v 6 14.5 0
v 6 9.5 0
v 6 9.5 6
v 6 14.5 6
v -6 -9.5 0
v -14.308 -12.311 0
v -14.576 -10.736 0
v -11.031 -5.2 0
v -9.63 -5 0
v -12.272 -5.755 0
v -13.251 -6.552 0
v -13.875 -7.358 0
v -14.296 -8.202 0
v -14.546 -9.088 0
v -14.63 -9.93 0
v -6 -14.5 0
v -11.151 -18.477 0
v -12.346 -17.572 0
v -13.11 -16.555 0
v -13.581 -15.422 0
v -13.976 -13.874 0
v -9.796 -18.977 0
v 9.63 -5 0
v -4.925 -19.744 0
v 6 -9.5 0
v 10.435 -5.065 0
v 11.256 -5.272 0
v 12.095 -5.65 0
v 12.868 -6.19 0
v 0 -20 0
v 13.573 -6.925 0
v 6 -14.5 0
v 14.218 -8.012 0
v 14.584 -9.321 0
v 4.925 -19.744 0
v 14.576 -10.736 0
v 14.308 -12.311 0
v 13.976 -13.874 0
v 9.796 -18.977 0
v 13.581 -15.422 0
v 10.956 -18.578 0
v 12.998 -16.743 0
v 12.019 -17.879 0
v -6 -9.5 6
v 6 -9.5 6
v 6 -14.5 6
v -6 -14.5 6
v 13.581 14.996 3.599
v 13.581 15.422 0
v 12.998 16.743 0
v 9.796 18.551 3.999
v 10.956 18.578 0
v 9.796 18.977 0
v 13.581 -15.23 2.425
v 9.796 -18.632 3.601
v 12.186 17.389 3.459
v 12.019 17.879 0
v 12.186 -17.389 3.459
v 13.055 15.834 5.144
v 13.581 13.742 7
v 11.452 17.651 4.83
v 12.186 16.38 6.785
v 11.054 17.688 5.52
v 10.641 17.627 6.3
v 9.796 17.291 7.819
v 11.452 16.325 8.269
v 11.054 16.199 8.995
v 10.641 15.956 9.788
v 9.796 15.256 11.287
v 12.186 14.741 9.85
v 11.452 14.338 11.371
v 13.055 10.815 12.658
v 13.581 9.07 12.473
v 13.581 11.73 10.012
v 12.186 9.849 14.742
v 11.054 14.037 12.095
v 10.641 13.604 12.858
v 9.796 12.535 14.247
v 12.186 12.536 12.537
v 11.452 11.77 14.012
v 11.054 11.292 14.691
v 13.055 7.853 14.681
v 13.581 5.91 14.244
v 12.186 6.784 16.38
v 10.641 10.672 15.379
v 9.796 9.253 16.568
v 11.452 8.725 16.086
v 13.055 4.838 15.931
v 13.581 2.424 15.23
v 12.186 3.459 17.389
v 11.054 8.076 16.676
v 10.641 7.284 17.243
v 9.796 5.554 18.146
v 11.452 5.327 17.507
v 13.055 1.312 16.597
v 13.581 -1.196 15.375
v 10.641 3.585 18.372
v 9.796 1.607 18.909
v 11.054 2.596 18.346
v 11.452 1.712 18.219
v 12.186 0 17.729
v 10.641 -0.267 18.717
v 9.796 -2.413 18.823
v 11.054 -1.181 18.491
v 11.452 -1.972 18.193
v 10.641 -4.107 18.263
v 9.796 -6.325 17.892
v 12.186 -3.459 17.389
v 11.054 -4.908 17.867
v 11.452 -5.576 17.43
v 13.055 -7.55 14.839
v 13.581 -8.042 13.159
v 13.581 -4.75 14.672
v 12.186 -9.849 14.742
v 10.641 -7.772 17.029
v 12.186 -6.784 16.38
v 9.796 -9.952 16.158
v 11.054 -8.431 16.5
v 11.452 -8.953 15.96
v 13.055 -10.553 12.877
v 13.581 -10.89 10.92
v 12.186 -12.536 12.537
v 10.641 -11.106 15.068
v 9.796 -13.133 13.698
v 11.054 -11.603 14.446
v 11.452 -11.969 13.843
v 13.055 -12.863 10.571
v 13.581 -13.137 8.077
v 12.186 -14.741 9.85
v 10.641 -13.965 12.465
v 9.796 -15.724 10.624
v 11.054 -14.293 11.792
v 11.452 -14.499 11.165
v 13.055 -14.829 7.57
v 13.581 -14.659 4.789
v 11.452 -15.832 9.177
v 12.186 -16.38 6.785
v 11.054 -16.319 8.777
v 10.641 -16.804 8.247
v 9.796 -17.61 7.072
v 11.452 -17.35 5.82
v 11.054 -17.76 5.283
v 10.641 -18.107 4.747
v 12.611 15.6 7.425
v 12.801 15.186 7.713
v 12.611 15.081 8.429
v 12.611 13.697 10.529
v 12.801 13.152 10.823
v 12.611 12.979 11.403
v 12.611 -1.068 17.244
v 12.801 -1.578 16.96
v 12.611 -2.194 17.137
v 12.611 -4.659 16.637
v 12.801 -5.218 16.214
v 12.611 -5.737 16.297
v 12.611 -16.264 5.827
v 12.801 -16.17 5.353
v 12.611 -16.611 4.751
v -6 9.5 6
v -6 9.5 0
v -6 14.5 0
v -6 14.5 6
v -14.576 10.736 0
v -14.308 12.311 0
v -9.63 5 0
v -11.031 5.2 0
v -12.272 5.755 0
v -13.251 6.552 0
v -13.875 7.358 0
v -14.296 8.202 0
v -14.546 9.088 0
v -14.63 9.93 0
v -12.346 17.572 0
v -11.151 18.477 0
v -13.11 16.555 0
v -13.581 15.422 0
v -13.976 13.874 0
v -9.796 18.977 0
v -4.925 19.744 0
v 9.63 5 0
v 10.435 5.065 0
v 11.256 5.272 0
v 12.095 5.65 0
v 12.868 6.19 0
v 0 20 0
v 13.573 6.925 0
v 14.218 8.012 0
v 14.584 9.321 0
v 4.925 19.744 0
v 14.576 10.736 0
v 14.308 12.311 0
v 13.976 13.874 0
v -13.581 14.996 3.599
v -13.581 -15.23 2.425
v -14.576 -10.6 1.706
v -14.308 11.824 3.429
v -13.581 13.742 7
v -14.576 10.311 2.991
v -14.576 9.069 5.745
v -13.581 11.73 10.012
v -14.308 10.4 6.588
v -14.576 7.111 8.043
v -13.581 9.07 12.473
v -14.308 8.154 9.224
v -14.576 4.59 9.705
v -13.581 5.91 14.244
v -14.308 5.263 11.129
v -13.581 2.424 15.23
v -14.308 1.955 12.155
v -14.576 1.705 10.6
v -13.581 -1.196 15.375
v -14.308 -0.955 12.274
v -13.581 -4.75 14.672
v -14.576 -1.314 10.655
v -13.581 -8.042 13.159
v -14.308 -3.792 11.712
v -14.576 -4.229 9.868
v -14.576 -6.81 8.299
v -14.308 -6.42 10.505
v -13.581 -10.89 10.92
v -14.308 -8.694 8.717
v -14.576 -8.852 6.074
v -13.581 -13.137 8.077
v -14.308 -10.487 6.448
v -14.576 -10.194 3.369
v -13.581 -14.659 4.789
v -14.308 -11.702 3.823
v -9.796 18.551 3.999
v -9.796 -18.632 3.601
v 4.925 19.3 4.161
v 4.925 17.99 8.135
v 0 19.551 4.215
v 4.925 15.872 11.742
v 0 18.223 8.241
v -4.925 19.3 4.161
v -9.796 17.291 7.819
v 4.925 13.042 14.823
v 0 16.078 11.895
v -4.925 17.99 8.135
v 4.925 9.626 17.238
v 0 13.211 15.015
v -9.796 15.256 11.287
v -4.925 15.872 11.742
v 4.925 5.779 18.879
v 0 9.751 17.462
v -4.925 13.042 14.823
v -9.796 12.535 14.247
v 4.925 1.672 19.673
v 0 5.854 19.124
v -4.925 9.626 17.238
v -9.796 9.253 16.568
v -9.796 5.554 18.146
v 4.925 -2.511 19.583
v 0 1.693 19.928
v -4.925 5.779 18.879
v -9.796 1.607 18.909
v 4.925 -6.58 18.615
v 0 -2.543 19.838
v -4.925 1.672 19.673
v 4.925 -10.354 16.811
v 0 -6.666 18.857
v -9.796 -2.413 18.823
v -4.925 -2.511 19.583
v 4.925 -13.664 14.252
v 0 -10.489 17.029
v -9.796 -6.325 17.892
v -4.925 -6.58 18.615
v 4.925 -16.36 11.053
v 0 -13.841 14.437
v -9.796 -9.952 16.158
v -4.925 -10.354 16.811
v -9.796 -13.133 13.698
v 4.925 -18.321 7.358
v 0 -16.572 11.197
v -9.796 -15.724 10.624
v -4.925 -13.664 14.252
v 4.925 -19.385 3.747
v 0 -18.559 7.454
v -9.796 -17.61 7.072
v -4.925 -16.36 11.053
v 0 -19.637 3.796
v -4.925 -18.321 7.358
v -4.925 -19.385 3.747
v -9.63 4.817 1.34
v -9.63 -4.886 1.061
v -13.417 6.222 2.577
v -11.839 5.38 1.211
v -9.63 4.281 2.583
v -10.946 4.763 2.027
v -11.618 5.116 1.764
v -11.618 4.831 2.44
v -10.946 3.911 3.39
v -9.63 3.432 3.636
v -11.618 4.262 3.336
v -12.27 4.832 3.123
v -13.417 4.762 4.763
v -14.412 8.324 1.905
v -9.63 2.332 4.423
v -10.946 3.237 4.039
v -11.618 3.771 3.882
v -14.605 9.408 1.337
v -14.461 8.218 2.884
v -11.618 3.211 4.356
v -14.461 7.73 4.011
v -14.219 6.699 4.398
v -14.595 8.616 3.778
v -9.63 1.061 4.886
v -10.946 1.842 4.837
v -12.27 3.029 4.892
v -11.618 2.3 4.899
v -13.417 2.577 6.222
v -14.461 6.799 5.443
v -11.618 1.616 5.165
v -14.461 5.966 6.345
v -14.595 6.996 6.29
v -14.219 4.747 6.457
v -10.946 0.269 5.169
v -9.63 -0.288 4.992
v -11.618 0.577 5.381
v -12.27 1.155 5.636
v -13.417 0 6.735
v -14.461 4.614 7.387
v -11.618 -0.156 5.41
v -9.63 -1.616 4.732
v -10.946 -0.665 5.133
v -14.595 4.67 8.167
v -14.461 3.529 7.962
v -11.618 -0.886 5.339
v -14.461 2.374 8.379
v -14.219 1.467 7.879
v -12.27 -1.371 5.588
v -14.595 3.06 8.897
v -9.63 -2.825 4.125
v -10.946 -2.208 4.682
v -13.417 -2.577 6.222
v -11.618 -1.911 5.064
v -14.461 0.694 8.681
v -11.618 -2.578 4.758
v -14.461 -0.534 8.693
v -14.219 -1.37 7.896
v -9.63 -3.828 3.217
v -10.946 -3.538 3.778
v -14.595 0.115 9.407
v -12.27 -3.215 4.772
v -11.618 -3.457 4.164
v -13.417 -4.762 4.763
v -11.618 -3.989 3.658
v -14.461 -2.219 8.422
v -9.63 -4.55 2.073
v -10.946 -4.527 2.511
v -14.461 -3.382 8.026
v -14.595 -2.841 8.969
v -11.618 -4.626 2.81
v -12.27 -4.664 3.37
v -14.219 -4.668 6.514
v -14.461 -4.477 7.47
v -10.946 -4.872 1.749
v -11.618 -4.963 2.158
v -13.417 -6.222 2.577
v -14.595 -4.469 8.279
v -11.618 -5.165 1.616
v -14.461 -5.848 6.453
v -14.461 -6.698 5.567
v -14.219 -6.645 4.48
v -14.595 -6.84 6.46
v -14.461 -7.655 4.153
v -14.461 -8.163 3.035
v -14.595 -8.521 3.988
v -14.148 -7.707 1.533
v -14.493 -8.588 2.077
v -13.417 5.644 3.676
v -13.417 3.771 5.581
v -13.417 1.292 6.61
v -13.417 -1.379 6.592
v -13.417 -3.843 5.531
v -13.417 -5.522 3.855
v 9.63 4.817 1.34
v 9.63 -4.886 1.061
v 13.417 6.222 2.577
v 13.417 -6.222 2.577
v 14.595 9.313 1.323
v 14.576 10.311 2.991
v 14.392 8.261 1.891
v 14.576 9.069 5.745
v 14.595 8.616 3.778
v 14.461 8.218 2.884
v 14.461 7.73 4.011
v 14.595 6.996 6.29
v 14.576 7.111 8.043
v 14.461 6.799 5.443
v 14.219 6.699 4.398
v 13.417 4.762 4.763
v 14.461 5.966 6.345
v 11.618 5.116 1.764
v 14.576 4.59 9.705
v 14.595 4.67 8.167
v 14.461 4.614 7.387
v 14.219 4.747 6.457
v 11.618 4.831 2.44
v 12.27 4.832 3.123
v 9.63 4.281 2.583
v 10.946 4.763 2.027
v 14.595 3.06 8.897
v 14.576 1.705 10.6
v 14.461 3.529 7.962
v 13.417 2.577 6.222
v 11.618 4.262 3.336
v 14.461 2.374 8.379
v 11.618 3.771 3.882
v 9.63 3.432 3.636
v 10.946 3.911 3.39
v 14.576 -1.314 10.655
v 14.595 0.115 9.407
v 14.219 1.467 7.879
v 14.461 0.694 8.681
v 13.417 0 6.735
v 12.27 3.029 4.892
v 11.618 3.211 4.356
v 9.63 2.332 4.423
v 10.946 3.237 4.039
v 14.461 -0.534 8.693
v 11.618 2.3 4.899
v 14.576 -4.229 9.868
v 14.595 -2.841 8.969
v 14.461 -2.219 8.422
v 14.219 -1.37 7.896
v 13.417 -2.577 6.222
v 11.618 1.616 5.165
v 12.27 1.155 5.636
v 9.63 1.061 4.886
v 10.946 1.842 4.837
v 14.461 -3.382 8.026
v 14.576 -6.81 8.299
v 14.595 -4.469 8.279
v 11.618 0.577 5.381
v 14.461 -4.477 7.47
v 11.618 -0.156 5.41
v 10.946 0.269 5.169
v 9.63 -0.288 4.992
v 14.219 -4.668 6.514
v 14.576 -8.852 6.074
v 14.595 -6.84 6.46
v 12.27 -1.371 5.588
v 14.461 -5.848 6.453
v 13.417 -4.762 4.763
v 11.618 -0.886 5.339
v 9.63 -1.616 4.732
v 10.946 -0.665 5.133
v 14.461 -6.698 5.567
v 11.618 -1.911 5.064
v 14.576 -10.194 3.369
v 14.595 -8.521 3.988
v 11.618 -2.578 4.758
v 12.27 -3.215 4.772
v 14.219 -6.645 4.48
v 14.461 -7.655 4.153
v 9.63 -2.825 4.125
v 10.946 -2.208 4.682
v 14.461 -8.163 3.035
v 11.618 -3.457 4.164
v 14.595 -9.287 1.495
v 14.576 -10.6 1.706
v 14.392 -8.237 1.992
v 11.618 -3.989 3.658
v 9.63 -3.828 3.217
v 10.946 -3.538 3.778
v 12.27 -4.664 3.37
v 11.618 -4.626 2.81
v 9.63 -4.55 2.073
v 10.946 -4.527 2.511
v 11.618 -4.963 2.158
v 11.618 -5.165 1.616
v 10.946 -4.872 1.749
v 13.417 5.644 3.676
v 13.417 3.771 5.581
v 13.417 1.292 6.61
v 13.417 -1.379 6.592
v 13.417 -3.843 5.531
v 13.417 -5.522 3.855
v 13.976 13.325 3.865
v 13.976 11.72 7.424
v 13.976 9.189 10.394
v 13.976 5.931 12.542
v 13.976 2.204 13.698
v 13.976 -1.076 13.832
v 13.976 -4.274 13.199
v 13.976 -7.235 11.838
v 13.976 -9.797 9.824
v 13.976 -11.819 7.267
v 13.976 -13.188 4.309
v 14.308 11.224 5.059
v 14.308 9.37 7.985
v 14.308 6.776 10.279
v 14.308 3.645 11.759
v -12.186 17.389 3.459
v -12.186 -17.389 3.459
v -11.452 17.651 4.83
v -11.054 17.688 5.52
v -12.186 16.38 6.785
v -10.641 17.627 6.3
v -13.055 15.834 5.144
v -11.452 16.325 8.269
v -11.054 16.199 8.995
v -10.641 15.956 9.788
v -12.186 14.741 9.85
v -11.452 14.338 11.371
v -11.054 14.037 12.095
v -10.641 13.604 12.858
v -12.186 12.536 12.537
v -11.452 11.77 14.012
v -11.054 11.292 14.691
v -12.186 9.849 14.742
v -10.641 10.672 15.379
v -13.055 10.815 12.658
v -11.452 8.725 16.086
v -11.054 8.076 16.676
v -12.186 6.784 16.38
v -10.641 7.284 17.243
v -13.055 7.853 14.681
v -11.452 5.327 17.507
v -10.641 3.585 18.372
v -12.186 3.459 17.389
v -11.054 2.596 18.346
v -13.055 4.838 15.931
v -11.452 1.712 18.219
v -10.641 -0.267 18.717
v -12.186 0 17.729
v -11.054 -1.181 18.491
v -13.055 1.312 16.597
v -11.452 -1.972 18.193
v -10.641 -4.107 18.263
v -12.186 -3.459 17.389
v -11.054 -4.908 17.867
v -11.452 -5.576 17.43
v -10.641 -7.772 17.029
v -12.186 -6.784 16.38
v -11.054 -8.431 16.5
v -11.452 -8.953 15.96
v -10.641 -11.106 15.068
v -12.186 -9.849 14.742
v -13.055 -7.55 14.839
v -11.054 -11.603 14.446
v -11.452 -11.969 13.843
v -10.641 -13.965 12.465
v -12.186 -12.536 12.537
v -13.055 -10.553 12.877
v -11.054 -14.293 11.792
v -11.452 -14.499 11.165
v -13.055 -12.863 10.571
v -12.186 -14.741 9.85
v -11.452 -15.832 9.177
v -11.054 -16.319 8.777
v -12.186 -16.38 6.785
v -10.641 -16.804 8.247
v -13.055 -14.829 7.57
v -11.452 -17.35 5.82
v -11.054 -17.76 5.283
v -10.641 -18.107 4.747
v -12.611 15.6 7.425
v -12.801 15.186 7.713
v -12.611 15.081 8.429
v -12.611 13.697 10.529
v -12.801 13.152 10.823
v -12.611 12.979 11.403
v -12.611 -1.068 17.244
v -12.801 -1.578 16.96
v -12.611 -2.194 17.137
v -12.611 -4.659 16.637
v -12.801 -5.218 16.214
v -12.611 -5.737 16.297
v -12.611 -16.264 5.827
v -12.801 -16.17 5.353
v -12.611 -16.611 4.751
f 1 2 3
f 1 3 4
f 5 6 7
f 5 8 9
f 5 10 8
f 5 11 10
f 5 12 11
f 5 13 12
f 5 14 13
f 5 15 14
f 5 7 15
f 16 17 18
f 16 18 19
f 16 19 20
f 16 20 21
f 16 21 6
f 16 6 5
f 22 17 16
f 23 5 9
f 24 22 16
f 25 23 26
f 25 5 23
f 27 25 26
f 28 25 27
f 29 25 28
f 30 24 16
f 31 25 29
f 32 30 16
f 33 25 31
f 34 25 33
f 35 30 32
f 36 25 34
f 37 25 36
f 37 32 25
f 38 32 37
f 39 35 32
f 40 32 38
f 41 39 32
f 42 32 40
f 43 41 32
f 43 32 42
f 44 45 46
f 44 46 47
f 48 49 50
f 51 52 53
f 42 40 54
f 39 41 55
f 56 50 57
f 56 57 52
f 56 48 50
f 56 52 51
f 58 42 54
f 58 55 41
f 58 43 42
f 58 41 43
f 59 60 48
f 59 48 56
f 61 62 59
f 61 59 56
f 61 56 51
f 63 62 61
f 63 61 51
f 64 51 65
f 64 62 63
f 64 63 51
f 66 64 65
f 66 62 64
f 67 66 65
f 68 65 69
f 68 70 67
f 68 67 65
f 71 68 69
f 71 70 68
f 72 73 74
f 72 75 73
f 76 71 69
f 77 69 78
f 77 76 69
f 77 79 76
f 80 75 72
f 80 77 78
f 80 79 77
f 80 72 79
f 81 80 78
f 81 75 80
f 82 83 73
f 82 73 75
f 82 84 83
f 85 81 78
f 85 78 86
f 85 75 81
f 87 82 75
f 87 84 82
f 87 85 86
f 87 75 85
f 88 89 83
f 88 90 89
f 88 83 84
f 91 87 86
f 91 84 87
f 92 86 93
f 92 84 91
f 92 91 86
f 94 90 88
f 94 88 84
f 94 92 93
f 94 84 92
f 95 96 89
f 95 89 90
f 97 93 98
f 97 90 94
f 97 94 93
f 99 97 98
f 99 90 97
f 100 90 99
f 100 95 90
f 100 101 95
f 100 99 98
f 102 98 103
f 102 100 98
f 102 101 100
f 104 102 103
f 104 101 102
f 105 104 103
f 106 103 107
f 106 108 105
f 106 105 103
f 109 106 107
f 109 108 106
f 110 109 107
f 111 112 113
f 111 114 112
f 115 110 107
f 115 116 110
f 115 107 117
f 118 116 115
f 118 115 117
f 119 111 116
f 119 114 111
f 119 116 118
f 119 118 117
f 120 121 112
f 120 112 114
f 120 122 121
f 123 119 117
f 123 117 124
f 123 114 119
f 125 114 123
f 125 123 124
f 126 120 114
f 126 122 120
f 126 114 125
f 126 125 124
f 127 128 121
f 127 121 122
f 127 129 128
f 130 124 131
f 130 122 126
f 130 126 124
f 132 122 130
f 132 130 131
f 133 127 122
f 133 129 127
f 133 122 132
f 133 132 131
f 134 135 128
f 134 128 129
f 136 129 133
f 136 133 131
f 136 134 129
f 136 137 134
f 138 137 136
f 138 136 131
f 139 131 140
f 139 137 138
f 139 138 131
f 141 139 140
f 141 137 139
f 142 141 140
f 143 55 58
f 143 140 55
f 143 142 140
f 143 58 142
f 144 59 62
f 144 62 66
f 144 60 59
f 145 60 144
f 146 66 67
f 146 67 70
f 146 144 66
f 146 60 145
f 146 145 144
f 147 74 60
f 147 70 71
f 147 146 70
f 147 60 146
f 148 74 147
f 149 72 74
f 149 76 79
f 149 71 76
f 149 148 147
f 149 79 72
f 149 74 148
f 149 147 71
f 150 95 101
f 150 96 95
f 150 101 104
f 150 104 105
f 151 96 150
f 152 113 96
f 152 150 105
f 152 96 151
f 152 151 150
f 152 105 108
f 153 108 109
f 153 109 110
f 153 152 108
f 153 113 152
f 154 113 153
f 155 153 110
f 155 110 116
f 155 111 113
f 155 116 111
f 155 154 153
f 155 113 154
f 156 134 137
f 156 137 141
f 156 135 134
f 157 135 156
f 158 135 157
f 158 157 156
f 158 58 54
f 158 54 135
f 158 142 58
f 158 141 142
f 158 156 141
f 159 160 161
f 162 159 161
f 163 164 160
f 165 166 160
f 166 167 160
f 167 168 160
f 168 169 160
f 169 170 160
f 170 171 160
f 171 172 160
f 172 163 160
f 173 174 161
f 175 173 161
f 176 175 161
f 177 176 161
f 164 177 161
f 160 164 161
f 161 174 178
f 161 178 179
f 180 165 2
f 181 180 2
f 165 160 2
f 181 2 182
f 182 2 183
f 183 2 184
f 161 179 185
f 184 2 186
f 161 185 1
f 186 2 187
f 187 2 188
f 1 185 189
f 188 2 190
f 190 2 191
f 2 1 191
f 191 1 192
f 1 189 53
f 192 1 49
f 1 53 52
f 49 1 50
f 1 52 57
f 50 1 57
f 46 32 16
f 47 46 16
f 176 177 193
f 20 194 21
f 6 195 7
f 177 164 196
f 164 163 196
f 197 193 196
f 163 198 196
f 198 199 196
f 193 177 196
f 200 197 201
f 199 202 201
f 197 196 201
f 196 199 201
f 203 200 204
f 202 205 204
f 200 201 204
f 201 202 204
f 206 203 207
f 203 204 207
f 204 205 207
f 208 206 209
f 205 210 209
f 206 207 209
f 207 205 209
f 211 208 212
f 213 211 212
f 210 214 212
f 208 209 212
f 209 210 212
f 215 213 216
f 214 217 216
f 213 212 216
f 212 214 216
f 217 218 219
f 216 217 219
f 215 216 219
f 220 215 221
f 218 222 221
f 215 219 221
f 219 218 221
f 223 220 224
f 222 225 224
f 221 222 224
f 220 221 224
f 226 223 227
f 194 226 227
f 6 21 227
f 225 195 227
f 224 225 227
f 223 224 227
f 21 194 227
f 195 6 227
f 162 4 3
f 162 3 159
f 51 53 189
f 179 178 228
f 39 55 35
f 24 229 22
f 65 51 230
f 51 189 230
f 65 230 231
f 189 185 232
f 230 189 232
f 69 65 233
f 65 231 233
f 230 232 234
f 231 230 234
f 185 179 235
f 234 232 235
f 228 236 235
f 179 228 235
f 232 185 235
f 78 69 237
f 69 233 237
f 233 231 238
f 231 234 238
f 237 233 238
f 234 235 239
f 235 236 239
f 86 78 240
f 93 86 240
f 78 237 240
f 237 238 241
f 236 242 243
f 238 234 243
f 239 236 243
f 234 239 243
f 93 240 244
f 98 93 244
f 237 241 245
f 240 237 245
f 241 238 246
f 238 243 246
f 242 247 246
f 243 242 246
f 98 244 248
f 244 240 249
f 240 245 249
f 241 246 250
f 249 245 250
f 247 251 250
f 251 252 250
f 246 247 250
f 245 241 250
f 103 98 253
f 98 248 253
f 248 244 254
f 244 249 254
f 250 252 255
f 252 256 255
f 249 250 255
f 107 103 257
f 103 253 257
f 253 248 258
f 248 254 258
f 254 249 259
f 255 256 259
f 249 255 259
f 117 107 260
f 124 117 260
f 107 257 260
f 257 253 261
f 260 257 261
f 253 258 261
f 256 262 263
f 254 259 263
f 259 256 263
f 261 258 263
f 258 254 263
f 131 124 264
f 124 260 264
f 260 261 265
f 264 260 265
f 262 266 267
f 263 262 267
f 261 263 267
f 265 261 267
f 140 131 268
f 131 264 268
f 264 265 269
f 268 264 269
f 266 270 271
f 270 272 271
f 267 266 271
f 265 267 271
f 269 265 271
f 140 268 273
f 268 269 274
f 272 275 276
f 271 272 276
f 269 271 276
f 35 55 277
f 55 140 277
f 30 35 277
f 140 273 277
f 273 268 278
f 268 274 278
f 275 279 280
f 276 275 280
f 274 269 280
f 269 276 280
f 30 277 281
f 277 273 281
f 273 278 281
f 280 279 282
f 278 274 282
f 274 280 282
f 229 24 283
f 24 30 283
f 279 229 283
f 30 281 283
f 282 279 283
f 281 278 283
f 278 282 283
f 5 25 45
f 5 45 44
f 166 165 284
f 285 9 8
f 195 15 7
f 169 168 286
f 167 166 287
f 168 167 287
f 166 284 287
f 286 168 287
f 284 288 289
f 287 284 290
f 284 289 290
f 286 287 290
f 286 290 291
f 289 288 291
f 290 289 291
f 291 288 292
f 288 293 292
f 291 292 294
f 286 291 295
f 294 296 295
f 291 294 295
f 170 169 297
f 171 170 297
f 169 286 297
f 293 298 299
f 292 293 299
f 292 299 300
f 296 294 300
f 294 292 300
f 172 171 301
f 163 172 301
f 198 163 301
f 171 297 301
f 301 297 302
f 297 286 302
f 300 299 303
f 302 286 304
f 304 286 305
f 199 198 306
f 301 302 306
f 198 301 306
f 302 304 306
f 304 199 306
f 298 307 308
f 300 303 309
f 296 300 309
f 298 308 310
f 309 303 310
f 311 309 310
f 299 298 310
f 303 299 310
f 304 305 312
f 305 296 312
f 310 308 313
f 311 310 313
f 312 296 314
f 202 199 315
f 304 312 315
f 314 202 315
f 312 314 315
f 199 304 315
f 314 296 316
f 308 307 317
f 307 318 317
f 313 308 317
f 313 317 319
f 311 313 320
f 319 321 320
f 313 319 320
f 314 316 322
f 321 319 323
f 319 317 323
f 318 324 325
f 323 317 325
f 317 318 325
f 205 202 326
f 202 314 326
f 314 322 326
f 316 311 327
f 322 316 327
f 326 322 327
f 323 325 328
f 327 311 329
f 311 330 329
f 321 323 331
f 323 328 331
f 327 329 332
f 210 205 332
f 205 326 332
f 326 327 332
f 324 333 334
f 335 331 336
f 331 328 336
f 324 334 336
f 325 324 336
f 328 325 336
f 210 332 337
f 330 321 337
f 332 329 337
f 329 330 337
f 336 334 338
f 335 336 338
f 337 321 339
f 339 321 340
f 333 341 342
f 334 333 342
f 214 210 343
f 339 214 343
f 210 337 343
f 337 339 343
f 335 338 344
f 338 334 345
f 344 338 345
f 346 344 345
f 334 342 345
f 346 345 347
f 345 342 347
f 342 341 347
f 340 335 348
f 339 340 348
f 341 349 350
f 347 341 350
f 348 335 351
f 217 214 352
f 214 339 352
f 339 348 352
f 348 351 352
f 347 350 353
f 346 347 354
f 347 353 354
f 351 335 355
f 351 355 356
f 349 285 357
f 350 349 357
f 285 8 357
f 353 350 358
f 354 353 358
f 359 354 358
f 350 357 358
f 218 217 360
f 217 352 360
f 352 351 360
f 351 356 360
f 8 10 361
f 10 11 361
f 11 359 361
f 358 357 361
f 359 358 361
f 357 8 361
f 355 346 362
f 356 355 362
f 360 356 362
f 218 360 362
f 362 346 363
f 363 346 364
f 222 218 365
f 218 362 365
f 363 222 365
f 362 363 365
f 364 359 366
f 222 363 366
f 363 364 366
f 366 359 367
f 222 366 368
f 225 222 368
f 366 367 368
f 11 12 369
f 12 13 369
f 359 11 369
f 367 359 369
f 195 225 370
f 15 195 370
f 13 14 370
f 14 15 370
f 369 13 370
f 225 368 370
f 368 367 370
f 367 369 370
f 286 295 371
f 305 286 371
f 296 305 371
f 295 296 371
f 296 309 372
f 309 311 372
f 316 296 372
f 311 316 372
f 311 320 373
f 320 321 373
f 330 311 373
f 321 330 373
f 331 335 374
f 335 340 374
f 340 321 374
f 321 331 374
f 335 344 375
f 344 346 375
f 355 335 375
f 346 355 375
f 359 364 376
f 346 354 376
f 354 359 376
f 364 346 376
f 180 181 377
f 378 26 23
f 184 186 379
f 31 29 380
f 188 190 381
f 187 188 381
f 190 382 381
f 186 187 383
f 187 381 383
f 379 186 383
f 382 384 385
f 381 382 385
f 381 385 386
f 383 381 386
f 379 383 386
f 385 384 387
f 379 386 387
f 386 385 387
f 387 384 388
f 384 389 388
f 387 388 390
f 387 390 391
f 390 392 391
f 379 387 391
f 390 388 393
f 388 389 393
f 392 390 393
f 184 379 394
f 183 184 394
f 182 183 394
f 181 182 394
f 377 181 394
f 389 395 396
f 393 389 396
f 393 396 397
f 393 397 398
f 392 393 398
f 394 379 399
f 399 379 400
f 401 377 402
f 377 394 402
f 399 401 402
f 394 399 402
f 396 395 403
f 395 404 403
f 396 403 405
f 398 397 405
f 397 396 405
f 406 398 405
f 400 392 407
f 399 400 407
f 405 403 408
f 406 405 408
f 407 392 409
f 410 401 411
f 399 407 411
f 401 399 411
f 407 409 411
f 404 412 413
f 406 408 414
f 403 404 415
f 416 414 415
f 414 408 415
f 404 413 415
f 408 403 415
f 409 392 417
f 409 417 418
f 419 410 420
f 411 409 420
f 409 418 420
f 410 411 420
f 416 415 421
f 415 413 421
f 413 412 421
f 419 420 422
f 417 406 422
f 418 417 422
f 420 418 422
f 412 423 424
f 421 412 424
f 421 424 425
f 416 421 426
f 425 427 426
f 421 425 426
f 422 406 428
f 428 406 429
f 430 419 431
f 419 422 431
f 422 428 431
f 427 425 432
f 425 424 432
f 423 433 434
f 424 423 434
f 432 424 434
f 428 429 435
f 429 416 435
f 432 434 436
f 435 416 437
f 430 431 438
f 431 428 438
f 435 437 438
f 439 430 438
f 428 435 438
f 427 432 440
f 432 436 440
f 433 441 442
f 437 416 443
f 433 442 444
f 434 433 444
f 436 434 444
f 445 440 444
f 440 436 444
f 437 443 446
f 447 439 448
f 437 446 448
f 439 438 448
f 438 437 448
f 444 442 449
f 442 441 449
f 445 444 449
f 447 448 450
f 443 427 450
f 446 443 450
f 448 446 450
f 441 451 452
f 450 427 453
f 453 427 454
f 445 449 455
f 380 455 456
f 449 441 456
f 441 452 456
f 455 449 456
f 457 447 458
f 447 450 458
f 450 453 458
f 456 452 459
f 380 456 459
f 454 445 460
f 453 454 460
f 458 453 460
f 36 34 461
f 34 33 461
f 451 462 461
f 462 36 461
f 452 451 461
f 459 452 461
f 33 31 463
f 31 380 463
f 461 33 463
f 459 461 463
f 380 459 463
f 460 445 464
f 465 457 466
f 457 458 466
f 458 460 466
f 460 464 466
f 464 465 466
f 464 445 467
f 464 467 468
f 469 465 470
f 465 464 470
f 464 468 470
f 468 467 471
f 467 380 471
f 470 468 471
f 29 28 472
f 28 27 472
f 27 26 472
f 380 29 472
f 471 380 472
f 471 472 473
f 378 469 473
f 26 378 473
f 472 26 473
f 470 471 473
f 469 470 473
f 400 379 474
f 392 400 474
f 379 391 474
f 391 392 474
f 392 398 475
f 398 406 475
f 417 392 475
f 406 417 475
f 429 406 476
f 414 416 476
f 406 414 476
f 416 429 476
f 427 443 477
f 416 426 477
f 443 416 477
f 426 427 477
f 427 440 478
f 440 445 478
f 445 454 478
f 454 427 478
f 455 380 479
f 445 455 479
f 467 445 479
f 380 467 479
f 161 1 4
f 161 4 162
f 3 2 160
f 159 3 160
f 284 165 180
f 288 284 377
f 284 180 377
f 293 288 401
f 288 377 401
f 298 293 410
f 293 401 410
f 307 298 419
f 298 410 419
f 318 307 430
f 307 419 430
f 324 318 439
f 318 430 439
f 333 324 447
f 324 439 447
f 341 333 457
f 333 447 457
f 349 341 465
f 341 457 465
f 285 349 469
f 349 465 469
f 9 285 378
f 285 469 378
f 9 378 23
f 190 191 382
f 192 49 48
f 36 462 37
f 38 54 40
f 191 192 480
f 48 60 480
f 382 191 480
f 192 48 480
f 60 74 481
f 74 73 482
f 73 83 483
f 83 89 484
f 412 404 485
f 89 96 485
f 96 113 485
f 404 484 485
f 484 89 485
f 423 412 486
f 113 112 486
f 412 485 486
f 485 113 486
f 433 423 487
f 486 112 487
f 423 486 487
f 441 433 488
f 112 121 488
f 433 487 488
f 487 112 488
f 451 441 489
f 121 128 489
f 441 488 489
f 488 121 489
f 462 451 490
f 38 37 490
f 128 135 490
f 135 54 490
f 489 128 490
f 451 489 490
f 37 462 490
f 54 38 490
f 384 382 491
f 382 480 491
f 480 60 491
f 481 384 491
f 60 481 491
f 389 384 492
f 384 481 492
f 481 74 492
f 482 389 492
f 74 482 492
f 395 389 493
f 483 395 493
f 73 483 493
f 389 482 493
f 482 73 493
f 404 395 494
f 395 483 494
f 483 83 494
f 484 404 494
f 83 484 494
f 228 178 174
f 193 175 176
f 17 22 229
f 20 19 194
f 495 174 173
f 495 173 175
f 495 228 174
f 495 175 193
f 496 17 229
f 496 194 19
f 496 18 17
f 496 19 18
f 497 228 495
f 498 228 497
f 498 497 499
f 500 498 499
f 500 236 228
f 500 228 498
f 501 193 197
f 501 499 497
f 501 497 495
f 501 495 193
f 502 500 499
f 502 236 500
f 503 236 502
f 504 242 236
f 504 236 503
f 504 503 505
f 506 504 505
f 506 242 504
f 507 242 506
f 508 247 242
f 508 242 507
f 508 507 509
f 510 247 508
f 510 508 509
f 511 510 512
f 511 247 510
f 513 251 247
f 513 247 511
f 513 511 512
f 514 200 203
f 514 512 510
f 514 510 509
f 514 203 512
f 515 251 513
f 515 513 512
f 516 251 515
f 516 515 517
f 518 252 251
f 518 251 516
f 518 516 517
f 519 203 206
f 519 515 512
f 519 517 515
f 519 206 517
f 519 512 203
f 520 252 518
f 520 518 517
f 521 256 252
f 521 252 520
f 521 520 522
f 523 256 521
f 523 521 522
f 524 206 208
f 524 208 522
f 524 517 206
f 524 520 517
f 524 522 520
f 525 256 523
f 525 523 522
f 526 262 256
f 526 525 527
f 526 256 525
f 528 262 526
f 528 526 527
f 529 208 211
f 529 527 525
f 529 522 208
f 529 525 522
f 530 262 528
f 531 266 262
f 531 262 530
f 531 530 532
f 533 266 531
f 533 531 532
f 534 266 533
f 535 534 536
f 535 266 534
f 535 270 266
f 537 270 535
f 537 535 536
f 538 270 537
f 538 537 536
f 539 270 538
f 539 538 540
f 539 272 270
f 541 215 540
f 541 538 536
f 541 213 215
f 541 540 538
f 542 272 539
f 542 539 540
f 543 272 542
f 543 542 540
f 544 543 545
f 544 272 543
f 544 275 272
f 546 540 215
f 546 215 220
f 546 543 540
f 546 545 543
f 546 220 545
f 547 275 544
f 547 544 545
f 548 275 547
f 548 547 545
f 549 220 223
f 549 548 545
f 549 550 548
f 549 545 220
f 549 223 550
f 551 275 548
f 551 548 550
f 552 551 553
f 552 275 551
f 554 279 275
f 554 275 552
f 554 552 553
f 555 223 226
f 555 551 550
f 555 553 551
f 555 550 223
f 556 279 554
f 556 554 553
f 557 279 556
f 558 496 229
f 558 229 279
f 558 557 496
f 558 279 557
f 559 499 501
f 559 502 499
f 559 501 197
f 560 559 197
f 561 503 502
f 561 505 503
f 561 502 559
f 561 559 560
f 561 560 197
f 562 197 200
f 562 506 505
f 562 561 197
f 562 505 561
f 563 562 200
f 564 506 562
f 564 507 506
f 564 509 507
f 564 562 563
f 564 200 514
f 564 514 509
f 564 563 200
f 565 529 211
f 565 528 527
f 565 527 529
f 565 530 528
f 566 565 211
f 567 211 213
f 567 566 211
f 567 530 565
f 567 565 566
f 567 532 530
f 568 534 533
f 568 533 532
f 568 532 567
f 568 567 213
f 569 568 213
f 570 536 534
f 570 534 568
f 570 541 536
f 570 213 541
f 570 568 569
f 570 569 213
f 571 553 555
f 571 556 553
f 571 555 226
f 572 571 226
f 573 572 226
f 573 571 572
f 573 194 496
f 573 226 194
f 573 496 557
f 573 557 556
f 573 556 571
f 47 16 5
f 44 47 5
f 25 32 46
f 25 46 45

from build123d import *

# Parameters (mm, degrees)
REVOLVE_1_ANGLE     = 180
FILLET_1_R          = 5
FILLET_2_R          = 5
SKETCH_2_W          = 12
SKETCH_2_H          = 5
CUT_EXTRUDE_1_DEPTH = 6


with BuildPart() as part:
    # 草图1 → 旋转1 (revolve)
    with BuildSketch(Plane.XY):
        with BuildLine():
            Line((-15, 5), (15, 5))
            ThreePointArc((15, 5), (14.412847263, 11.739422714), (12.669081334, 18.275770872))
            ThreePointArc((12.669081334, 18.275770872), (0, 20), (-12.669081334, 18.275770872))
            ThreePointArc((-12.669081334, 18.275770872), (-14.412847263, 11.739422714), (-15, 5))
        make_face()
    revolve(axis=Axis((-17.5, 0, 0), (1, 0, 0)), revolution_arc=REVOLVE_1_ANGLE)

    # 圆角1
    fillet_1_edges = [part.edges().sort_by_distance(p)[0] for p in [
        (12.669081334, 0, 18.275770872),
        (-12.669081334, 0, 18.275770872),
    ]]
    fillet(fillet_1_edges, radius=FILLET_1_R)

    # 圆角2
    fillet_2_edges = [part.edges().sort_by_distance(p)[0] for p in [
        (-15, 0, 5),
        (15, 0, 5),
    ]]
    fillet(fillet_2_edges, radius=FILLET_2_R)

    # 草图2 → 切除-拉伸1 (cut)
    with BuildSketch(Plane(origin=(0, 0, 0), x_dir=(-1, 0, 0), z_dir=(0, 0, -1))):
        with Locations((0, 12)):
            Rectangle(SKETCH_2_W, SKETCH_2_H)
        with Locations((0, -12)):
            Rectangle(SKETCH_2_W, SKETCH_2_H)
    extrude(amount=-CUT_EXTRUDE_1_DEPTH, mode=Mode.SUBTRACT)


solid = part.part
